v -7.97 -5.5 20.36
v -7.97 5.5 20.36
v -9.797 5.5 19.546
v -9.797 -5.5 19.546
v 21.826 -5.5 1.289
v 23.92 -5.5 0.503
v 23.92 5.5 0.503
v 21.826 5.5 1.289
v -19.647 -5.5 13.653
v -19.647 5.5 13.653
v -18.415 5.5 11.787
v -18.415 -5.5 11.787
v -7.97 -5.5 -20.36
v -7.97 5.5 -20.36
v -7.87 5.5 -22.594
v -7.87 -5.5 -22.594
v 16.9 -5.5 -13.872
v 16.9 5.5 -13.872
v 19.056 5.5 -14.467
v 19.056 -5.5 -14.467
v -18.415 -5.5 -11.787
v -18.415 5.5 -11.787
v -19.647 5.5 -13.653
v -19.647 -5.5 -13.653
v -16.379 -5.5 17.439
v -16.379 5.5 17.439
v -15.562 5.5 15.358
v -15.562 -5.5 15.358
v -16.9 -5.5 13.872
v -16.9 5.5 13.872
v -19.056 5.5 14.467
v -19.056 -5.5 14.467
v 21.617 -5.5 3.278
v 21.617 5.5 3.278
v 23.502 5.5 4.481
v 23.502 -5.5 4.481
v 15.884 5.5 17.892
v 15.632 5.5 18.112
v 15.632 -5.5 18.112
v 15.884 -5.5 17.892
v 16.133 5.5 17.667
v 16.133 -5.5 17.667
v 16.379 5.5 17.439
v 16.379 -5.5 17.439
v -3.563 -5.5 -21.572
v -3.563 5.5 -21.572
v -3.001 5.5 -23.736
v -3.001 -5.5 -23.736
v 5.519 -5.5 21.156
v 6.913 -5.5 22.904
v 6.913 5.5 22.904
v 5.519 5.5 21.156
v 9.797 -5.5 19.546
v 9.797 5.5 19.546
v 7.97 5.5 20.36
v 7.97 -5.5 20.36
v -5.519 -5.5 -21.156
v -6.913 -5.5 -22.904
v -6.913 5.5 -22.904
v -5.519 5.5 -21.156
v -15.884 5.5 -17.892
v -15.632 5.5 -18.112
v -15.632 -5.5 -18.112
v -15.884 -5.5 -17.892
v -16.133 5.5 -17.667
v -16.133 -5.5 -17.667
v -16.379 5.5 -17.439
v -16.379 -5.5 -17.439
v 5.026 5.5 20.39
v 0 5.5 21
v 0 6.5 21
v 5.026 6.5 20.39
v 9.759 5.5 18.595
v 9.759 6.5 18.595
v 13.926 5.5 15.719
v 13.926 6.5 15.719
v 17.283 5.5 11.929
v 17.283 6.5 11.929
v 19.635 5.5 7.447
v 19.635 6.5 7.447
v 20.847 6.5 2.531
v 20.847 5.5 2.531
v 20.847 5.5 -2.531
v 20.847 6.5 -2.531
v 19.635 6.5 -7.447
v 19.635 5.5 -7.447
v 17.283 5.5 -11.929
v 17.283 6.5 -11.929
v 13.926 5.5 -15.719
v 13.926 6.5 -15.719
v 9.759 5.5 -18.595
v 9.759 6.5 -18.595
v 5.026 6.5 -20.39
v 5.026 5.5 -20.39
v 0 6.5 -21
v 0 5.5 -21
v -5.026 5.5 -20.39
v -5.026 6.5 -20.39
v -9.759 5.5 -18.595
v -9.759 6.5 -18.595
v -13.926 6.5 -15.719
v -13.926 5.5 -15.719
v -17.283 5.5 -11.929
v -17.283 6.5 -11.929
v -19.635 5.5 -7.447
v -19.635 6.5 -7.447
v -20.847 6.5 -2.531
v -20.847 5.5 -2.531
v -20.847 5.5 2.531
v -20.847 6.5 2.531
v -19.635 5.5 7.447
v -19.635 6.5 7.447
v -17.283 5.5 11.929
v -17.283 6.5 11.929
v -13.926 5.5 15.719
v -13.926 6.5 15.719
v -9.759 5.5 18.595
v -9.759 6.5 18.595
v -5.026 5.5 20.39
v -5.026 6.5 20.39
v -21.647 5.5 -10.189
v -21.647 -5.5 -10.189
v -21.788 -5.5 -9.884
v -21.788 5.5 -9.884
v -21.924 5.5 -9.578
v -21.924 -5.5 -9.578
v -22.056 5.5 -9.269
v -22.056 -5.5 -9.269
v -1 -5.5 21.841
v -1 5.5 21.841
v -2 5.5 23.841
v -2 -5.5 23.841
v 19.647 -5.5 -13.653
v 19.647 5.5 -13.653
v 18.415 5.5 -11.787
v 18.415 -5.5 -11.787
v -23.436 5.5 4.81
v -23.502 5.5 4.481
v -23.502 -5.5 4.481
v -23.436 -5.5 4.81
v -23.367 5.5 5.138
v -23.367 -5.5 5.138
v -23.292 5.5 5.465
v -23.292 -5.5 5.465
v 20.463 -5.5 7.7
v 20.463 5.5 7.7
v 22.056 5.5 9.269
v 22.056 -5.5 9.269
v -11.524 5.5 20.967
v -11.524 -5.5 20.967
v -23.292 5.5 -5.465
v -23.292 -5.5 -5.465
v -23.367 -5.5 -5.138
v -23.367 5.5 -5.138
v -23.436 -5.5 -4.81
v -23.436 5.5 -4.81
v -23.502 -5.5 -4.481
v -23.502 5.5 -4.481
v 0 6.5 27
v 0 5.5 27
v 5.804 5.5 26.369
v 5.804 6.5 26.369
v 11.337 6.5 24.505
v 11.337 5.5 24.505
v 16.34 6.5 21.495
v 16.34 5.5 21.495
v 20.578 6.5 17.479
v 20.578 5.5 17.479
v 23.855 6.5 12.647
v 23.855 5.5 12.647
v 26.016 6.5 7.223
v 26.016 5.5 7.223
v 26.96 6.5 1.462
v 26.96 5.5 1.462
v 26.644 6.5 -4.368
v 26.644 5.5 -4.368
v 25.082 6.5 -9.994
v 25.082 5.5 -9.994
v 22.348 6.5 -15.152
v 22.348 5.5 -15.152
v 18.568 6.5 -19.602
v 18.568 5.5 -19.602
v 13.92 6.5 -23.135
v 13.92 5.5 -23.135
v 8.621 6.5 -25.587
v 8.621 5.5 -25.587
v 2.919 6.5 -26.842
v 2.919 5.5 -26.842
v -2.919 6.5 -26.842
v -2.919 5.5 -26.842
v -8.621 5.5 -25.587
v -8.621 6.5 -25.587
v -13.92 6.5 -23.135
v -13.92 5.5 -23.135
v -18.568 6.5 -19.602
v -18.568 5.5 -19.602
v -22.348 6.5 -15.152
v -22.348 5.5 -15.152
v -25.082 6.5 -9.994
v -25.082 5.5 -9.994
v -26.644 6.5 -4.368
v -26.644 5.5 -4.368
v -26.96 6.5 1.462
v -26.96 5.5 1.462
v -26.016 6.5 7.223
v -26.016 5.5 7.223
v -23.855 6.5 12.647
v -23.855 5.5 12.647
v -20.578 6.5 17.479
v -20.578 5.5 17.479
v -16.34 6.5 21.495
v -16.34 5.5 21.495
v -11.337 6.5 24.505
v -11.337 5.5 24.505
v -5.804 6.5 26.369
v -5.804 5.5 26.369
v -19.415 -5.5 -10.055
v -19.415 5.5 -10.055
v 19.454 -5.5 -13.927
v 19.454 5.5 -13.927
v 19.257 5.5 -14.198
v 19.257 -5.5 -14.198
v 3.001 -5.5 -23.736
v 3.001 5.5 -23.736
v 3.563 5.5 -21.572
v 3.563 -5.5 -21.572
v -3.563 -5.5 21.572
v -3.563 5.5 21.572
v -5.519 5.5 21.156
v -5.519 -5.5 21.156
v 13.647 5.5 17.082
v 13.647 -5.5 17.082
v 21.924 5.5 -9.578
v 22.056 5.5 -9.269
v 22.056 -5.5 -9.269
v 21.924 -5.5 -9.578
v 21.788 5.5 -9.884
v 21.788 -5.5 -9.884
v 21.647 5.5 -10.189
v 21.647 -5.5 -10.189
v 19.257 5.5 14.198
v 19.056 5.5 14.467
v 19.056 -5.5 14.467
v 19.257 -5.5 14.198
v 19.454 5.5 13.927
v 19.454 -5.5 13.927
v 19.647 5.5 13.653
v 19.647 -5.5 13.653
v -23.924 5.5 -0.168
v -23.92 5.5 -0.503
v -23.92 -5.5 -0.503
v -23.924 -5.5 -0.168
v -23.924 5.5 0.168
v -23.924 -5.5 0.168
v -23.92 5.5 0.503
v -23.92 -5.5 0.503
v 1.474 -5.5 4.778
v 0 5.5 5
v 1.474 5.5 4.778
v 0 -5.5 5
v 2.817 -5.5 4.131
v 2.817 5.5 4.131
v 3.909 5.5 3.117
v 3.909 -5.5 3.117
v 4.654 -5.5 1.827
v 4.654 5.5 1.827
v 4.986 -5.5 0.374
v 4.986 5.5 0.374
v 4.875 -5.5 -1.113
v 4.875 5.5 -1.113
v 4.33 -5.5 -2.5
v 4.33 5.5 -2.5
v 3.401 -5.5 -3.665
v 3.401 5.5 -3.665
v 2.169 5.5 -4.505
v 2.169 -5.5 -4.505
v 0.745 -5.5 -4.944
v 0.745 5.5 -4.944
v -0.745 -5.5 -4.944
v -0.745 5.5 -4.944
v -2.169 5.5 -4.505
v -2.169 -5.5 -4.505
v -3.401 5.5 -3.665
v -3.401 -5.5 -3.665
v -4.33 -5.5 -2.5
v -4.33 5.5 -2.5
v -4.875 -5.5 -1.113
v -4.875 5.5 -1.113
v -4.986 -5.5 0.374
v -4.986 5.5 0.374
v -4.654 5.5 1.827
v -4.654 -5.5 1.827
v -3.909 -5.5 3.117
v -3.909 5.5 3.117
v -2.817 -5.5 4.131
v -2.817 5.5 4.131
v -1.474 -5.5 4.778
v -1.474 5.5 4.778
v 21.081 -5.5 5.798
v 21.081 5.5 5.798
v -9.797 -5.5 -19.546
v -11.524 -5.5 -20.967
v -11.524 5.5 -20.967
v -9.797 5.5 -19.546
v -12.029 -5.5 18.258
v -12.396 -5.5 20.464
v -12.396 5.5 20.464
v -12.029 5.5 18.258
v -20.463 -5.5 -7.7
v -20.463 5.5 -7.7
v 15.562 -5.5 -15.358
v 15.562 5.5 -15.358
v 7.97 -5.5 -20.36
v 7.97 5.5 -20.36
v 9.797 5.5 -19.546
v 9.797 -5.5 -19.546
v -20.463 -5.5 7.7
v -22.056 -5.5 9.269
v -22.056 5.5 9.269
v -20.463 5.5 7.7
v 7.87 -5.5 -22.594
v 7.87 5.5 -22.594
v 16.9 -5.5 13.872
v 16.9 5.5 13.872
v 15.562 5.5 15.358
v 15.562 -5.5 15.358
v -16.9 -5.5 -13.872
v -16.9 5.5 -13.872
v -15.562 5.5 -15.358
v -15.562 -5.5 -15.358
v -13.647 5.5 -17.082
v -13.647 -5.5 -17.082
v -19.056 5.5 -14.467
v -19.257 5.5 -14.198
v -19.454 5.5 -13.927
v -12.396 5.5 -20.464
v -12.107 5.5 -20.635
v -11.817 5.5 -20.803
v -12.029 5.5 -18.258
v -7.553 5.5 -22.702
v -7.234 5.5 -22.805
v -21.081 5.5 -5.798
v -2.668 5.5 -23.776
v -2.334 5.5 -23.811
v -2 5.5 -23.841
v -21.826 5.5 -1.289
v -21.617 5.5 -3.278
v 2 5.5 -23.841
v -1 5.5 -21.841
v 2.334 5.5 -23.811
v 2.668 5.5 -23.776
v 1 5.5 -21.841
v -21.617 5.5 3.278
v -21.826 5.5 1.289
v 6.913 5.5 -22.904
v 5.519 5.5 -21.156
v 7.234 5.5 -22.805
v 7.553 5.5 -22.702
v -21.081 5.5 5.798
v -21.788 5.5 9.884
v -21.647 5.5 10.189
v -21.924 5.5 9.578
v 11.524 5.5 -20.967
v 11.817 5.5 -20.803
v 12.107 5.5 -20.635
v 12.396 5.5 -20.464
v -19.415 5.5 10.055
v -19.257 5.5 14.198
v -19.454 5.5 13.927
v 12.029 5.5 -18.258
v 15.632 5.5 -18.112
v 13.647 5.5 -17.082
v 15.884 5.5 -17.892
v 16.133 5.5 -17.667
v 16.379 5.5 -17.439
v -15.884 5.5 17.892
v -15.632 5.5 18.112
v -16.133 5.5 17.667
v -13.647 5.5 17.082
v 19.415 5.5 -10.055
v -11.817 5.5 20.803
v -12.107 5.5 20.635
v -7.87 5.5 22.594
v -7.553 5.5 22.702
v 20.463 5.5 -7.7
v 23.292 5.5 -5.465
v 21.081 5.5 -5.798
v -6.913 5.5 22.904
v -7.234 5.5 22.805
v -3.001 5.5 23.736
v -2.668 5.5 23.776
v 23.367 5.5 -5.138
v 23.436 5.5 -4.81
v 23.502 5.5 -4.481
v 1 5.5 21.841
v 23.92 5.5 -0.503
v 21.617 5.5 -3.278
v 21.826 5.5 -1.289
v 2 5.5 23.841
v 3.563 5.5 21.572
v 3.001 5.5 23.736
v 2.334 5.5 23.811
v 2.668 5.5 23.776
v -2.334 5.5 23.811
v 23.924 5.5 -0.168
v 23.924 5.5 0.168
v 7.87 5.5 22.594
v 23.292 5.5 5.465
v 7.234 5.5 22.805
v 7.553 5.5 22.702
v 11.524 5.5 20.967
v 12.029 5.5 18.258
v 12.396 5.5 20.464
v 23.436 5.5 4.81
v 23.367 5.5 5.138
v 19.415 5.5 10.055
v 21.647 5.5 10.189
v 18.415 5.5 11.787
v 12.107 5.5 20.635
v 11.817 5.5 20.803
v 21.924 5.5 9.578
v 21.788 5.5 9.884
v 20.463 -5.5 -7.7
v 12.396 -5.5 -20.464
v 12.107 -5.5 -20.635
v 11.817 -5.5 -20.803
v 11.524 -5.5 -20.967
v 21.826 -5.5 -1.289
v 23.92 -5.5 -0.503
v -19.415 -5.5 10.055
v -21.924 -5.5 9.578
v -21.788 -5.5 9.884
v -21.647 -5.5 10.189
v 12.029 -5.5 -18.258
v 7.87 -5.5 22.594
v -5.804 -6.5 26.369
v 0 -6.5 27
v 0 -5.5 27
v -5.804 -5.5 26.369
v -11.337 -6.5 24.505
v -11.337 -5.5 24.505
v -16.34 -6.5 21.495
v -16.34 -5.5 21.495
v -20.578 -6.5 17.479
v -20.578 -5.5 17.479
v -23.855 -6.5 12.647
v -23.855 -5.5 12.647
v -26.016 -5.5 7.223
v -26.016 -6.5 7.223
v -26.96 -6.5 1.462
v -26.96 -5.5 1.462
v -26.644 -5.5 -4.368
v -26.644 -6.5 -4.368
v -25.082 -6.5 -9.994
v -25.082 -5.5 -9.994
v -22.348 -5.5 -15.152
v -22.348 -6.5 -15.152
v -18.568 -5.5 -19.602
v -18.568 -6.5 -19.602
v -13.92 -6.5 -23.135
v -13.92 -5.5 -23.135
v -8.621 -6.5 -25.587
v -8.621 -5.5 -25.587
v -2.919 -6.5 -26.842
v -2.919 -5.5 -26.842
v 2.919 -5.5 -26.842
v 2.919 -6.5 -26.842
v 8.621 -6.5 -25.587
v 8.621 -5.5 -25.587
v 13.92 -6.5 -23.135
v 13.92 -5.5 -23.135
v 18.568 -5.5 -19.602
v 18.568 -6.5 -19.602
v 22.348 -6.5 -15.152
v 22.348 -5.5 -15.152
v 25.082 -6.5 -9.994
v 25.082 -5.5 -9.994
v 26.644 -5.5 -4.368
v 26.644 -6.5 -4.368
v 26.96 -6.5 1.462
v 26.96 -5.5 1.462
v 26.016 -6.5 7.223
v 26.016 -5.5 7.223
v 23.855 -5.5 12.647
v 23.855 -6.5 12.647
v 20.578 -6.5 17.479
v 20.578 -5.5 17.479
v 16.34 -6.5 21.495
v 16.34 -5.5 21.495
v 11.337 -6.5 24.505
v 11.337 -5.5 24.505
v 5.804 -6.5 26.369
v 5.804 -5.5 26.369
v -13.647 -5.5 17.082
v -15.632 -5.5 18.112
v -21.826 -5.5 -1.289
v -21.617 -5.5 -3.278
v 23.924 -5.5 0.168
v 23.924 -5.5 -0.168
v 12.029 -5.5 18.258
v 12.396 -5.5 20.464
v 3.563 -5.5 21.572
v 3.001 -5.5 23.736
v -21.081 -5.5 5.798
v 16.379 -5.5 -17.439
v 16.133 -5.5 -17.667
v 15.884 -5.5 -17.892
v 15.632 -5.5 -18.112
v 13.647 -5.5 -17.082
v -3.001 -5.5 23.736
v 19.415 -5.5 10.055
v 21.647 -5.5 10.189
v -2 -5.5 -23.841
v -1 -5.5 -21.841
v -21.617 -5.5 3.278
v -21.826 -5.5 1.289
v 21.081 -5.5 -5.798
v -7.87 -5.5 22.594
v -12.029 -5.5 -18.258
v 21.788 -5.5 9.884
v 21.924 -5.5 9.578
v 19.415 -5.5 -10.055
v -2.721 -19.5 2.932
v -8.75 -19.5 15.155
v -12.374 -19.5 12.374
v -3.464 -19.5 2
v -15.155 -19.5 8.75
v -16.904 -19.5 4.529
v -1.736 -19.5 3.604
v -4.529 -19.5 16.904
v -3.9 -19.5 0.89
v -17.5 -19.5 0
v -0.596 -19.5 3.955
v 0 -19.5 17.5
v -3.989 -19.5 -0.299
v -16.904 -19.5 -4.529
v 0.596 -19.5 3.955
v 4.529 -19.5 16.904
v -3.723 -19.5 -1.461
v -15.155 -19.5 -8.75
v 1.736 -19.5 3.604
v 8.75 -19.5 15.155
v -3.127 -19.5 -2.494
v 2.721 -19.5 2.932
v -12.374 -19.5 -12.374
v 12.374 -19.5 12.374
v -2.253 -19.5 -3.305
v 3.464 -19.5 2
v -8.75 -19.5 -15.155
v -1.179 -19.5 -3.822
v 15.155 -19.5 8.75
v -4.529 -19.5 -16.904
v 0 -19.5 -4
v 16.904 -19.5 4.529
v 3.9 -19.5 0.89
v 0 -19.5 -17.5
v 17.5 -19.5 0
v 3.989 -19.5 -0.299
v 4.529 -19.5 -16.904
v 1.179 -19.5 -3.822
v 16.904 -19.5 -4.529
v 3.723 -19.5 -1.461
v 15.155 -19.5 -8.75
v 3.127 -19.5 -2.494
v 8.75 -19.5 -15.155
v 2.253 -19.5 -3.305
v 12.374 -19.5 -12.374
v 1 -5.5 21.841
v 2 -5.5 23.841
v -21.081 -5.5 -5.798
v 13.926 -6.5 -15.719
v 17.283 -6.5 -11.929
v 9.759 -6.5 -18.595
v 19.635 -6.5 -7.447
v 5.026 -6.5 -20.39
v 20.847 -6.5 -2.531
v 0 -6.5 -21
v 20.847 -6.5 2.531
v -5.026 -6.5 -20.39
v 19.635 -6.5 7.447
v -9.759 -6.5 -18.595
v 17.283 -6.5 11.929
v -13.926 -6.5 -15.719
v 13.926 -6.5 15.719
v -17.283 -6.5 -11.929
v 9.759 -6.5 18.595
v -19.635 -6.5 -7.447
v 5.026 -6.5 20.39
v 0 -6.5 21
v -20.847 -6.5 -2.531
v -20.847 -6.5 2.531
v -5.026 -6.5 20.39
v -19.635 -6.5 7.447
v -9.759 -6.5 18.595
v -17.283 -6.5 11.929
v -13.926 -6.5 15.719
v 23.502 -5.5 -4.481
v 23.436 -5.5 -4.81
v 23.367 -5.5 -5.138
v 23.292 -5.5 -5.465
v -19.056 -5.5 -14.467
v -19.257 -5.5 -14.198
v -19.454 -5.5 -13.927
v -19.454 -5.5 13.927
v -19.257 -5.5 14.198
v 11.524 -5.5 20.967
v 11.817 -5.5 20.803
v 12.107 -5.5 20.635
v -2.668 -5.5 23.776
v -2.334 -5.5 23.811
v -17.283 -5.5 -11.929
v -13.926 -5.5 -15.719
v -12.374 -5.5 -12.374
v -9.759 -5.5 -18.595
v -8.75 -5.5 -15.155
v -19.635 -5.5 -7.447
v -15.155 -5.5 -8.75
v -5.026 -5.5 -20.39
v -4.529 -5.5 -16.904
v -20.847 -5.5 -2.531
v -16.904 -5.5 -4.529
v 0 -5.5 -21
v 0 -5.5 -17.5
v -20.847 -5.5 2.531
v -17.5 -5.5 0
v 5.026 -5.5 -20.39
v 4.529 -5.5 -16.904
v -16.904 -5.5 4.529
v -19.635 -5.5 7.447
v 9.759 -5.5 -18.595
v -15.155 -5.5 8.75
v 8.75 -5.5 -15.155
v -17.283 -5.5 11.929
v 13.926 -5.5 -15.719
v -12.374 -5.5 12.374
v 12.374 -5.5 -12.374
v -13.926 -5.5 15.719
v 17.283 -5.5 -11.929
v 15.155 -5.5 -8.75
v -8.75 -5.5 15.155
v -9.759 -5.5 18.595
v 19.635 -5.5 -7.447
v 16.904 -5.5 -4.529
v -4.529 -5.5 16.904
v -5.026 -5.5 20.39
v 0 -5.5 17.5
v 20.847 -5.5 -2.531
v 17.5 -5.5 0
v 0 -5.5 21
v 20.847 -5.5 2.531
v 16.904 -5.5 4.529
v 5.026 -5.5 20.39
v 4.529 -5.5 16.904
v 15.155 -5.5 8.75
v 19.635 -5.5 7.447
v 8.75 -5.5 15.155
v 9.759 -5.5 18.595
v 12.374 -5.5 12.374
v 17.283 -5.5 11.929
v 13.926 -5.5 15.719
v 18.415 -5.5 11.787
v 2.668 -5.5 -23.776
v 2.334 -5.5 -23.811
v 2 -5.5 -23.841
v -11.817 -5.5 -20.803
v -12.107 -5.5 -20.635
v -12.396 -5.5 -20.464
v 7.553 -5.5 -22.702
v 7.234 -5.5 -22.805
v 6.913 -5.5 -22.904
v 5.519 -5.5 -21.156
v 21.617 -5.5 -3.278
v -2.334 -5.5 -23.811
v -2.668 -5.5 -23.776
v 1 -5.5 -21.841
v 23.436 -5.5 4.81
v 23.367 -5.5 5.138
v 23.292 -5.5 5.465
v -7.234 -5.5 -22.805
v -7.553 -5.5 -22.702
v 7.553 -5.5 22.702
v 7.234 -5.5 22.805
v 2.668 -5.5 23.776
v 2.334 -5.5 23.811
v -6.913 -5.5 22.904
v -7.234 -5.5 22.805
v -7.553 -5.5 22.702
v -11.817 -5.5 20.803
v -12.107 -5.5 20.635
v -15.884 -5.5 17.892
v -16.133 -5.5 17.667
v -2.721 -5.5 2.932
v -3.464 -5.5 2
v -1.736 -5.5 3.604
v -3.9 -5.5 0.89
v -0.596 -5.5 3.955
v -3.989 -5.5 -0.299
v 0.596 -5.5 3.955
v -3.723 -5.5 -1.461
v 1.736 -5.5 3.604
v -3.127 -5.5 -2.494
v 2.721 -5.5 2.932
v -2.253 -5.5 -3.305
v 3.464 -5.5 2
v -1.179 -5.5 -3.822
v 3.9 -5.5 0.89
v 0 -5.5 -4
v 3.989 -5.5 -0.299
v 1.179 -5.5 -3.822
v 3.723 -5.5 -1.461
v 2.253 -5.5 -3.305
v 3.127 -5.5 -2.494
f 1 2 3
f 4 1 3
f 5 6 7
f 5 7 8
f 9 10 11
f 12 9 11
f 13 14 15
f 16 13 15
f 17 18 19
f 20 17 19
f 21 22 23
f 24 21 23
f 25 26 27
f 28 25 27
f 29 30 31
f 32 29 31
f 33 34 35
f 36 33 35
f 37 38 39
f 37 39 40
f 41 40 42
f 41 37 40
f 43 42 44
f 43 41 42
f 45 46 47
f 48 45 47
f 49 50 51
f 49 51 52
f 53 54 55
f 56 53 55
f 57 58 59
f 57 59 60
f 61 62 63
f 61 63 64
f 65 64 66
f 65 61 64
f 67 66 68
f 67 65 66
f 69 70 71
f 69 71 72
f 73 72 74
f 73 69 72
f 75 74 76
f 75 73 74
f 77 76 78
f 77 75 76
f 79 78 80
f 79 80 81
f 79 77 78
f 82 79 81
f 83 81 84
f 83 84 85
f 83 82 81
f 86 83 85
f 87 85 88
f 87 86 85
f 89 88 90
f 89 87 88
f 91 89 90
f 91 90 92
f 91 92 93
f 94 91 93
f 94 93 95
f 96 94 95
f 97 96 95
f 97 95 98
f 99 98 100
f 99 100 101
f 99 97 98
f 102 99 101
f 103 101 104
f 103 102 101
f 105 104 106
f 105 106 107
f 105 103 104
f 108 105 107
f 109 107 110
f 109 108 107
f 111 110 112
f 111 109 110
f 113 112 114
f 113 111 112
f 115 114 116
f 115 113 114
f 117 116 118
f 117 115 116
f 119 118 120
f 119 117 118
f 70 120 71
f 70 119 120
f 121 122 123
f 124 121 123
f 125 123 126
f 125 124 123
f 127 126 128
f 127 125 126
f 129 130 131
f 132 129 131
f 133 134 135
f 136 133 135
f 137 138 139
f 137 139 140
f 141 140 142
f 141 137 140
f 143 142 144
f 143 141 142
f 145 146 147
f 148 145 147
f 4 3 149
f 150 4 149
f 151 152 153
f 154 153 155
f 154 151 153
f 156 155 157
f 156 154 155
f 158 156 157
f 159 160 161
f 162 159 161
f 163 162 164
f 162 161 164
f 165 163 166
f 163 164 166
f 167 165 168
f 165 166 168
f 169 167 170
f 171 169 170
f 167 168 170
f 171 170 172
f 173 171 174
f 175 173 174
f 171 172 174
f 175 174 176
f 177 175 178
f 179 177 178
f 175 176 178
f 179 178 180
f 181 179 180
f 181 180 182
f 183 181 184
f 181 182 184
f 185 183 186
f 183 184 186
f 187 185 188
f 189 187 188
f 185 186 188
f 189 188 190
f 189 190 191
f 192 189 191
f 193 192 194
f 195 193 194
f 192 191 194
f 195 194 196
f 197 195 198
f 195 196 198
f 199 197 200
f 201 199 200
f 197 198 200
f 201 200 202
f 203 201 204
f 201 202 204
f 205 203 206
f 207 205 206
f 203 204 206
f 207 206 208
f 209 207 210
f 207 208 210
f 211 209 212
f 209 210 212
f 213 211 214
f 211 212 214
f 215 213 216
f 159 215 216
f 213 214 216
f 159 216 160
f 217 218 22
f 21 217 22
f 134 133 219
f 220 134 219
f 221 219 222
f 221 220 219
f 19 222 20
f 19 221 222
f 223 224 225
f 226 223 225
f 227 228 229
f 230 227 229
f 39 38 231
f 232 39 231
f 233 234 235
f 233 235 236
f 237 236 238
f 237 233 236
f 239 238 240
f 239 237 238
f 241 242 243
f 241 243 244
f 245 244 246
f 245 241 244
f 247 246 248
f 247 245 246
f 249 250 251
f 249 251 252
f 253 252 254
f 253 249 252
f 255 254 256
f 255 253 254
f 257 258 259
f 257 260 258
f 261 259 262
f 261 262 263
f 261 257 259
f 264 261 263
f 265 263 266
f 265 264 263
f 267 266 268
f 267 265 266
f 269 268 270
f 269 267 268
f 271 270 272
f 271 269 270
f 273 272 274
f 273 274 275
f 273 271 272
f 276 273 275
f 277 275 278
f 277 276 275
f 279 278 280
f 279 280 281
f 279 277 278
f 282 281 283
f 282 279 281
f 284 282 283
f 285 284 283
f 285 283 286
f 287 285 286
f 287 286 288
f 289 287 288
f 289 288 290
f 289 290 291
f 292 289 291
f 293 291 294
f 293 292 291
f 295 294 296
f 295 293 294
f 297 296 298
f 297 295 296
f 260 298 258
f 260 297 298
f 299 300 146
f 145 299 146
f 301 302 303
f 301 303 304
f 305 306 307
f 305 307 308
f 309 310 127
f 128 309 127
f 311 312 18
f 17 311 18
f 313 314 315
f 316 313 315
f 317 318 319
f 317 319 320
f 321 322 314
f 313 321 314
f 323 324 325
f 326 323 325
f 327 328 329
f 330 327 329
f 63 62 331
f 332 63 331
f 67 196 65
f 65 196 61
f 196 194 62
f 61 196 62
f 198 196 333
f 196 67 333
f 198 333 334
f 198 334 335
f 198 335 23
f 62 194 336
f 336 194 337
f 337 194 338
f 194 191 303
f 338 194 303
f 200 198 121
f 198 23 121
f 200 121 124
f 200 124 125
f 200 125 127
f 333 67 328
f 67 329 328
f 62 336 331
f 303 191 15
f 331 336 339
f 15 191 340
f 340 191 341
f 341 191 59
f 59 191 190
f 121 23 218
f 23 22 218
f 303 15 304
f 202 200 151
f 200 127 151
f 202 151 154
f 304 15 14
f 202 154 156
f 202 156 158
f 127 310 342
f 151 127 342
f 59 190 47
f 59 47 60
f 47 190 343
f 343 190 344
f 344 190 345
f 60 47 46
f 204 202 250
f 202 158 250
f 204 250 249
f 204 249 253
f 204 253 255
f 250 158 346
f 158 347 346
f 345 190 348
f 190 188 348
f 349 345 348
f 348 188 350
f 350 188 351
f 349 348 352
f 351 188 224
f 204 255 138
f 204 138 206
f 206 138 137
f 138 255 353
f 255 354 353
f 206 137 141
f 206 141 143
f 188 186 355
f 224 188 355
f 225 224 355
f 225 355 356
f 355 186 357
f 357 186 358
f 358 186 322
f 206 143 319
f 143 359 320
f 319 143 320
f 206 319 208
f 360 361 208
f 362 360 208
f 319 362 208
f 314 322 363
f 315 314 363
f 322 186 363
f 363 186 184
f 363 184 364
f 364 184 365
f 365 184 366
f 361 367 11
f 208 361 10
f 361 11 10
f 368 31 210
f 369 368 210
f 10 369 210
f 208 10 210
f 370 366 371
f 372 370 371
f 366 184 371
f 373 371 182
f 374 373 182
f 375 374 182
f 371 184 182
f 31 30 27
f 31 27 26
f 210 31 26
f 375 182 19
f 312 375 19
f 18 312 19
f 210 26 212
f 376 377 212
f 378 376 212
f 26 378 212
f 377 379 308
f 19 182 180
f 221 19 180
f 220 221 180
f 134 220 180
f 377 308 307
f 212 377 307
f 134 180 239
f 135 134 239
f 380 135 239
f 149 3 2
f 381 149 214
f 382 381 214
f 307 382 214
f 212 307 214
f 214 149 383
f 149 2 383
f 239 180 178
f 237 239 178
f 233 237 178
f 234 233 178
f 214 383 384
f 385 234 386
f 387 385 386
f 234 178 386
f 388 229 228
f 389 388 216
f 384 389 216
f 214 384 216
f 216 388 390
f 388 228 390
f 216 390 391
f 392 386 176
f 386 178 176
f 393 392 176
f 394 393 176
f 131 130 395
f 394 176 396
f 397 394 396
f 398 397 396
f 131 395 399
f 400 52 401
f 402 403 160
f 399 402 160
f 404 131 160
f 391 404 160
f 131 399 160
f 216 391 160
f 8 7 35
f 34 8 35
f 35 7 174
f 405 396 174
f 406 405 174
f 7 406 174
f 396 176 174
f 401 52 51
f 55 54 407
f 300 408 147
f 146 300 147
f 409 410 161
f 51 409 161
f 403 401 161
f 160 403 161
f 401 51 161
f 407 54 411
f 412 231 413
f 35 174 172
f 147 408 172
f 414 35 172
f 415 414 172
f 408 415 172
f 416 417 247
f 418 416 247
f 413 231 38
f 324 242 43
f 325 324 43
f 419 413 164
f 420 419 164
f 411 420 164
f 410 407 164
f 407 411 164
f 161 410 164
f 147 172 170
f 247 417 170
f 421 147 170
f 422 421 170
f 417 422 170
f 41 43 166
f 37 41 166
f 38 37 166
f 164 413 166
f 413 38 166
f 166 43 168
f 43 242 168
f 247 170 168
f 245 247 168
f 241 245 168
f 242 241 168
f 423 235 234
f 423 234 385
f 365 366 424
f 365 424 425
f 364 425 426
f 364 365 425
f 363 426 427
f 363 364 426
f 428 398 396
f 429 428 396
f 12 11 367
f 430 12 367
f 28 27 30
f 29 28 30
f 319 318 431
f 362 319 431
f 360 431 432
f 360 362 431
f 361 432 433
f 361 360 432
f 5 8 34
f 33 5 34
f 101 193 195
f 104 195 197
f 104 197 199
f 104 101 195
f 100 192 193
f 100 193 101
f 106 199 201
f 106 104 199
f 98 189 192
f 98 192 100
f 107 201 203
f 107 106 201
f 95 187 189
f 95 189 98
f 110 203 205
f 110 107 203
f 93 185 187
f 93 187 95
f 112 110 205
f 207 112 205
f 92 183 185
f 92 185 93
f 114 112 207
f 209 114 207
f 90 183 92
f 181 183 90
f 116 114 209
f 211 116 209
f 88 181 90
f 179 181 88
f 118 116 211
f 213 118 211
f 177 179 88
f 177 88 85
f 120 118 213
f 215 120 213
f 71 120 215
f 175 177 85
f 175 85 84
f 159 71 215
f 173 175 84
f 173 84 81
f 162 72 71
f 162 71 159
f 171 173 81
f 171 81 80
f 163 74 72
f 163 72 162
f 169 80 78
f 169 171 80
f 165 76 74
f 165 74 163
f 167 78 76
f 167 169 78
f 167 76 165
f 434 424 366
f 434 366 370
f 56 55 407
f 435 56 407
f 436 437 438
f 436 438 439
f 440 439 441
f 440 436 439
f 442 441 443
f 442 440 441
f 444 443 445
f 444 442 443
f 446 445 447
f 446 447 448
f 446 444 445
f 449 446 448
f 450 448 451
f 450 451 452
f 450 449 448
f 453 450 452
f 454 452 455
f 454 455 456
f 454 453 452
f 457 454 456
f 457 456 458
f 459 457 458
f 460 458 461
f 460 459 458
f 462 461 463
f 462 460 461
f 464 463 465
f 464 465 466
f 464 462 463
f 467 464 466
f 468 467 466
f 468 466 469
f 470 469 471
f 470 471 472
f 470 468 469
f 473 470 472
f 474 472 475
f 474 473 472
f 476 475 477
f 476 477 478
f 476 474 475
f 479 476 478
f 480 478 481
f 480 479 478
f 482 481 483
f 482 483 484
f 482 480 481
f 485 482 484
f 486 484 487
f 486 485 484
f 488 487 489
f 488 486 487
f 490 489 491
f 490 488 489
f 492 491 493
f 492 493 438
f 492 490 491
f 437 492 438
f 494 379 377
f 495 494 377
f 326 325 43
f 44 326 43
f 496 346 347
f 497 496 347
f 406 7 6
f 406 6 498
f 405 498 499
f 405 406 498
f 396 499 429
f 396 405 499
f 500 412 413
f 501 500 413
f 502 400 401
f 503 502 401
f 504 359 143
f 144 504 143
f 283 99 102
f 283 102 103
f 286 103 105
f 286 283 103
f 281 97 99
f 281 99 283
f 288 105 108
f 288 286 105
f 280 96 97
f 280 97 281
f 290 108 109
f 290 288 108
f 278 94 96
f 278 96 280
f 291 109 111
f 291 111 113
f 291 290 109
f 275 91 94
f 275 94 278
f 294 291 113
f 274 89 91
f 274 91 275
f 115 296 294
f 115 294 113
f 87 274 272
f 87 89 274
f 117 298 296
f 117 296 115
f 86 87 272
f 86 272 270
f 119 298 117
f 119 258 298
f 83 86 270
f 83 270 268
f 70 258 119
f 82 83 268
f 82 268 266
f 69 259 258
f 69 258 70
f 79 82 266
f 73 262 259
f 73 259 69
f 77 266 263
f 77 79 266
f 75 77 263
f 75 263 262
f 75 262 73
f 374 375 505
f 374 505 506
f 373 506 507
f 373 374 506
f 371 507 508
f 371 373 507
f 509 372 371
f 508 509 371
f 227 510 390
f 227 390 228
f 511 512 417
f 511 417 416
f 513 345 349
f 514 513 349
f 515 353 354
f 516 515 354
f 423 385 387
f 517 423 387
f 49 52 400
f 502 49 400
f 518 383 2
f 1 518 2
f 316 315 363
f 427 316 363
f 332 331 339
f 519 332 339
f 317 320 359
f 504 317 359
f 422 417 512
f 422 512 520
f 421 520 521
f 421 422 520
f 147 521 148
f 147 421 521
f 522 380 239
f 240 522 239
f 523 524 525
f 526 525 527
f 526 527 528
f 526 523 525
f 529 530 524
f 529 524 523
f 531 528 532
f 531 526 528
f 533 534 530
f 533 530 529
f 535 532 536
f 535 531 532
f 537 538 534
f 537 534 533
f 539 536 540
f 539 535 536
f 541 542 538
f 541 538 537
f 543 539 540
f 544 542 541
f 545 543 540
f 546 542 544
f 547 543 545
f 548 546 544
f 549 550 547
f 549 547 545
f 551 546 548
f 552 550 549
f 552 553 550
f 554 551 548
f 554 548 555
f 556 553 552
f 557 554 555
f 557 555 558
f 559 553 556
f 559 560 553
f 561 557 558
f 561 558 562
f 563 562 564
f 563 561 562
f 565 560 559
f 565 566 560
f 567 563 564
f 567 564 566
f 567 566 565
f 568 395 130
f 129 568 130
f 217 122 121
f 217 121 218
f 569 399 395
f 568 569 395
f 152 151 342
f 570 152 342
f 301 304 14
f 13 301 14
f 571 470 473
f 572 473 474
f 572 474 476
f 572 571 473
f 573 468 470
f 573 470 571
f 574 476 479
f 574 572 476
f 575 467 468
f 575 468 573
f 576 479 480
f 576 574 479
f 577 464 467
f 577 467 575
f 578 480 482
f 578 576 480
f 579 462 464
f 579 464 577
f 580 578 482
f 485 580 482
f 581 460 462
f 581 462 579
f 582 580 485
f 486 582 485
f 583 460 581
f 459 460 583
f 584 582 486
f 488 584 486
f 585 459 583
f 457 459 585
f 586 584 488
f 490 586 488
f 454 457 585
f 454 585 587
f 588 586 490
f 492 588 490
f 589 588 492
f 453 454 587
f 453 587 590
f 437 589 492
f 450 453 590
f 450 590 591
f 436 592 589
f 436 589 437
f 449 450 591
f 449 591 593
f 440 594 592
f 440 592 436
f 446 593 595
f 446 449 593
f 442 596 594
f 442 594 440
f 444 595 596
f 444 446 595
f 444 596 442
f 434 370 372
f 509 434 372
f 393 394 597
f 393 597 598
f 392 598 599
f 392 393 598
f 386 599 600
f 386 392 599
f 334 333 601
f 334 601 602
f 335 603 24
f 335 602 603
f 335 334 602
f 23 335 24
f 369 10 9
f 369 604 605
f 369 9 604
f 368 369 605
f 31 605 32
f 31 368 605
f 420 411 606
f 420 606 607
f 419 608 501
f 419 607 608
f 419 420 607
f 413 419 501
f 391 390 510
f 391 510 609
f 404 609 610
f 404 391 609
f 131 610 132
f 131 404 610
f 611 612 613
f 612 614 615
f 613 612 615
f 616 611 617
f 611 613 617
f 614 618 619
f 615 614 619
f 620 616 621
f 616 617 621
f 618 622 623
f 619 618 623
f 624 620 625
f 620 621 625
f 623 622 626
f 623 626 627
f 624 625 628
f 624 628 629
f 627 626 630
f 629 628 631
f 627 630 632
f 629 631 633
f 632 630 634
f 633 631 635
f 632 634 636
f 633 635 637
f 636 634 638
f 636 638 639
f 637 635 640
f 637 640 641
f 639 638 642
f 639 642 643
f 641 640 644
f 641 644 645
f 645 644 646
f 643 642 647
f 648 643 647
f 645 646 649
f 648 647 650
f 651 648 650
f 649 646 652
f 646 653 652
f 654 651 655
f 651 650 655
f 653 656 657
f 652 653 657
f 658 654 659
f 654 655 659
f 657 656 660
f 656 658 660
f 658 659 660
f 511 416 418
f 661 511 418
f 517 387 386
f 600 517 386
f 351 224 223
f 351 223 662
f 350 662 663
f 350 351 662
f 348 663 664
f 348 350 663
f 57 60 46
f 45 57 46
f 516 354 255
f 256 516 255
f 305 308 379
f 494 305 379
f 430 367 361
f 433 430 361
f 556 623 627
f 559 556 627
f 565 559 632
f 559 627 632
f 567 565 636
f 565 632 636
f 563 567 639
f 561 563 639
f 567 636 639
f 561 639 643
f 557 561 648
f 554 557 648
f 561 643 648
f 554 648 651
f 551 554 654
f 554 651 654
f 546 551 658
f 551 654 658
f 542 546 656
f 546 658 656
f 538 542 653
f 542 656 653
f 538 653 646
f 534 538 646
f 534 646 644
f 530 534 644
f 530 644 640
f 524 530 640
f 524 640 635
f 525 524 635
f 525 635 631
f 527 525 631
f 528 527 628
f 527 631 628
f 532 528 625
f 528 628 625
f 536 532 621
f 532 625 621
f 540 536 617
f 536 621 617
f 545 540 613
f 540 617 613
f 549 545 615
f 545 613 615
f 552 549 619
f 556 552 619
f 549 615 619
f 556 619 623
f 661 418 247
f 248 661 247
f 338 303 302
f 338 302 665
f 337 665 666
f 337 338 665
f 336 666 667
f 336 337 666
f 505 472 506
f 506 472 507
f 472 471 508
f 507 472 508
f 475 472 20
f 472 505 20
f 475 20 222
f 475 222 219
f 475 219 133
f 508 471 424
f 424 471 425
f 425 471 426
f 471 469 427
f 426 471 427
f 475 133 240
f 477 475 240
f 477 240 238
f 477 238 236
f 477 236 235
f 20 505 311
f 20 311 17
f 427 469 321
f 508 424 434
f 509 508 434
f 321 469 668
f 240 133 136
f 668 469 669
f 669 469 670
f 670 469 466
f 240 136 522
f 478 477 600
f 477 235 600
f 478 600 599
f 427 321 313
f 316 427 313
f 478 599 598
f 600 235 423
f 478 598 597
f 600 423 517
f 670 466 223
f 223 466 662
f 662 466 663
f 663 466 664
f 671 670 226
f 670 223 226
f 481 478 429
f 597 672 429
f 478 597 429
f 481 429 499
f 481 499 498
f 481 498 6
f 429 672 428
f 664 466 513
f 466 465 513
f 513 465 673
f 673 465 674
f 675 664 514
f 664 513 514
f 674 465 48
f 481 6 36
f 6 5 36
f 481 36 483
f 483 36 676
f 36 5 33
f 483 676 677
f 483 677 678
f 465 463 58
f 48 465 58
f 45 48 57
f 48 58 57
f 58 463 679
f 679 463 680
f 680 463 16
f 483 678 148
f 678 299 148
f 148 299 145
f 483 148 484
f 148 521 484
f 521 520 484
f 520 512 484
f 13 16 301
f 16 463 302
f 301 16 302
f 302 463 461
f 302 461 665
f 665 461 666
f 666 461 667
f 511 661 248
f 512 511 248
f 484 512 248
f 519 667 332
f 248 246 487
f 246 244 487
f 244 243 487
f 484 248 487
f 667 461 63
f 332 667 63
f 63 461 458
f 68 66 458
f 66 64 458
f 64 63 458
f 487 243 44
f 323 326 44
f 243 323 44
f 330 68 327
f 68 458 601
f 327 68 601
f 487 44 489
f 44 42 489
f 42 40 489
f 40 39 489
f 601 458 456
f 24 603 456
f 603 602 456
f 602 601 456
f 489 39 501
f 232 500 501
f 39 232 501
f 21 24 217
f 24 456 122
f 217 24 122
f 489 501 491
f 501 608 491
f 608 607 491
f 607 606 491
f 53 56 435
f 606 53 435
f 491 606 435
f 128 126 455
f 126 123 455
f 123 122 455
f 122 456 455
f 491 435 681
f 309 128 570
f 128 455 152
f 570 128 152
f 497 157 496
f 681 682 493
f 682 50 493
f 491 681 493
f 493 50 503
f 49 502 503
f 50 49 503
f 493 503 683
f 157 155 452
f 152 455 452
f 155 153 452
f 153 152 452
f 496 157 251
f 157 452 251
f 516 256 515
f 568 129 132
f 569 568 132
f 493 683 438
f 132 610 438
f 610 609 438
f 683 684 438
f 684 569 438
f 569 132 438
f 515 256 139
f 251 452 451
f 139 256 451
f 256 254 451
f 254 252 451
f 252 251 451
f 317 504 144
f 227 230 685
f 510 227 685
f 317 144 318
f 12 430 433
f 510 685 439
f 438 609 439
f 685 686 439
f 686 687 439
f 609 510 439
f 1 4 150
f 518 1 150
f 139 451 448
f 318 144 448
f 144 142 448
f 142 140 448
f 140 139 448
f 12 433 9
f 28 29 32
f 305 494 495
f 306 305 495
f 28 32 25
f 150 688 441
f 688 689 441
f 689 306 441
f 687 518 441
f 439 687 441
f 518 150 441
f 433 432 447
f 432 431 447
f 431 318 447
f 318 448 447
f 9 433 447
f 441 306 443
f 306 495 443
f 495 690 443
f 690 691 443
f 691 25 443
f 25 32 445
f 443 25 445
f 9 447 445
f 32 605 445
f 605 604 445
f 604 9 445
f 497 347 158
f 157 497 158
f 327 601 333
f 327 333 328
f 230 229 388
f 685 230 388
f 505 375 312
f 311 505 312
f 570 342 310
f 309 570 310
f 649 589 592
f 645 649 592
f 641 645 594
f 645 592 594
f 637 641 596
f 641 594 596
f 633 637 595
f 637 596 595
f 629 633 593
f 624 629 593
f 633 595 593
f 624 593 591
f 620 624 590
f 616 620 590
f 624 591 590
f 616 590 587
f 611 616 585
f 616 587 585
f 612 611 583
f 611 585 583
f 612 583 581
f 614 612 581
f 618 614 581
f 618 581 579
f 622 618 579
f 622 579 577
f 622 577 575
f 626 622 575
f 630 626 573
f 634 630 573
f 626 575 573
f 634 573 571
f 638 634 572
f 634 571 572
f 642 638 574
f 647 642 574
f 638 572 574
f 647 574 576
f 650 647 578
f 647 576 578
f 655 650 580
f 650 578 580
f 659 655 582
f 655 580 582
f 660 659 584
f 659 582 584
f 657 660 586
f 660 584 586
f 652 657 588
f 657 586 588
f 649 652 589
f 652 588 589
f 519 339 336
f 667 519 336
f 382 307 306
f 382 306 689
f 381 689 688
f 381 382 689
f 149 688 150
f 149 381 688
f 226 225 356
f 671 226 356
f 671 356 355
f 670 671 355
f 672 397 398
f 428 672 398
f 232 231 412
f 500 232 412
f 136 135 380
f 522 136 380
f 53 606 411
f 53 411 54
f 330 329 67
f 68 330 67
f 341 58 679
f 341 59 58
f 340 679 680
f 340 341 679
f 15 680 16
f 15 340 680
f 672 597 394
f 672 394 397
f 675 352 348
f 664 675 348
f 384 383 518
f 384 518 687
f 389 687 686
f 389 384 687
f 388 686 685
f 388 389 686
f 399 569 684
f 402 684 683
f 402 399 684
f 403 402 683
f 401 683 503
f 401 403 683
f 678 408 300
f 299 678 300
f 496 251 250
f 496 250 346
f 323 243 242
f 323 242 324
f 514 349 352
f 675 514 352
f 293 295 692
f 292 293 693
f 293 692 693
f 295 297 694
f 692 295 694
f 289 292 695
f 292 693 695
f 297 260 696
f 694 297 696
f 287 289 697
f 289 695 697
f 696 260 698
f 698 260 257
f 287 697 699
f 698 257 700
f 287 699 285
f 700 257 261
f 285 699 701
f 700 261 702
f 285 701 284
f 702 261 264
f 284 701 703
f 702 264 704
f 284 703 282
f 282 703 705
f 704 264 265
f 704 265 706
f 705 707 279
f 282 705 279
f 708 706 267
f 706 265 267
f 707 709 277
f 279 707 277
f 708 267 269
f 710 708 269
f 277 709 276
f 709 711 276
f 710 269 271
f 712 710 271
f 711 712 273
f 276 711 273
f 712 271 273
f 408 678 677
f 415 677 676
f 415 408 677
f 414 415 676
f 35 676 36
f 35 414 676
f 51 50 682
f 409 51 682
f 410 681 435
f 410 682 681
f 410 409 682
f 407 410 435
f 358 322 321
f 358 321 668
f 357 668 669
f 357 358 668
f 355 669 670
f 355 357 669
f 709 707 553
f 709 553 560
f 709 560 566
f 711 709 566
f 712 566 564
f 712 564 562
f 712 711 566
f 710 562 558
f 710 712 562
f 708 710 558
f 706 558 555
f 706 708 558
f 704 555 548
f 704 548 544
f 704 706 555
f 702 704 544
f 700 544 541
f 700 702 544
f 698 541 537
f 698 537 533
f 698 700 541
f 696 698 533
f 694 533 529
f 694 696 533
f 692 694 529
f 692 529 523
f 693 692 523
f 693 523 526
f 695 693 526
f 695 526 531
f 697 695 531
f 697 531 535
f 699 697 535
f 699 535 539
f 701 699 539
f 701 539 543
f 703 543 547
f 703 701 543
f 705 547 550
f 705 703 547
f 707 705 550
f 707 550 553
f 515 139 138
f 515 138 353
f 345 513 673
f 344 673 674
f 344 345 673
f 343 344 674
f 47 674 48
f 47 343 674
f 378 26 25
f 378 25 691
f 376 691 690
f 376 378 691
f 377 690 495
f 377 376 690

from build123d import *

# Parameters (mm, degrees)
SKETCH1_R           = 23.925
SKETCH1_R_2         = 5
BOSS_EXTRUDE1_DEPTH = 5.5
SKETCH2_R           = 17.5
SKETCH2_R_2         = 4
BOSS_EXTRUDE3_DEPTH = 14
CUT_EXTRUDE1_DEPTH  = 11
CIRPATTERN10_COUNT  = 30
SKETCH4_R           = 27
SKETCH4_R_2         = 21
BOSS_EXTRUDE4_DEPTH = 1
BOSS_EXTRUDE5_START = 1
SKETCH5_R           = 27
SKETCH5_R_2         = 21
BOSS_EXTRUDE5_DEPTH = 1


with BuildPart() as part:
    # Sketch1 → Boss-Extrude1 (new, symmetric)
    with BuildSketch(Plane(origin=(0, 0, 0), x_dir=(1, 0, 0), z_dir=(0, 1, 0))):
        with Locations(Location((0, 0, 0), (0, 0, 270))):
            Circle(SKETCH1_R)
        with Locations(Location((0, 0, 0), (0, 0, 270))):
            Circle(SKETCH1_R_2, mode=Mode.SUBTRACT)
    extrude(amount=BOSS_EXTRUDE1_DEPTH, both=True)

    # Sketch2 → Boss-Extrude3 (add)
    with BuildSketch(Plane.XZ.offset(5.5)):
        with Locations(Location((0, 0, 0), (0, 0, 270))):
            Circle(SKETCH2_R)
        with Locations(Location((0, 0, 0), (0, 0, 270))):
            Circle(SKETCH2_R_2, mode=Mode.SUBTRACT)
    extrude(amount=BOSS_EXTRUDE3_DEPTH)

    # Sketch3 → Cut-Extrude1 (cut)
    with BuildSketch(Plane(origin=(0, 5.5, 0), x_dir=(1, 0, 0), z_dir=(0, 1, 0))):
        Polygon((-1, 21.84125888), (1, 21.84125888), (2, 23.84125888), (2.094207699, 23.965937646), (-2.062339383, 23.965937646), (-2, 23.84125888), align=None)
    cut_extrude1 = extrude(amount=-CUT_EXTRUDE1_DEPTH, mode=Mode.SUBTRACT)

    # CirPattern10: Cut-Extrude1 ×30 about axis
    cirpattern10_axis = Axis((0, 0, 0), (0, 1, 0))
    for i in range(1, CIRPATTERN10_COUNT):
        add(cut_extrude1.rotate(cirpattern10_axis, i * 360 / CIRPATTERN10_COUNT), mode=Mode.SUBTRACT)

    # Sketch4 → Boss-Extrude4 (add)
    with BuildSketch(Plane(origin=(0, 5.5, 0), x_dir=(1, 0, 0), z_dir=(0, 1, 0))):
        with Locations(Location((0, 0, 0), (0, 0, 270))):
            Circle(SKETCH4_R)
        with Locations(Location((0, 0, 0), (0, 0, 270))):
            Circle(SKETCH4_R_2, mode=Mode.SUBTRACT)
    extrude(amount=BOSS_EXTRUDE4_DEPTH)

    # Sketch5 → Boss-Extrude5 (add)
    with BuildSketch(Plane.XZ.offset(5.5).offset(BOSS_EXTRUDE5_START)):
        with Locations(Location((0, 0, 0), (0, 0, 90))):
            Circle(SKETCH5_R)
        with Locations(Location((0, 0, 0), (0, 0, 90))):
            Circle(SKETCH5_R_2, mode=Mode.SUBTRACT)
    extrude(amount=-BOSS_EXTRUDE5_DEPTH)


solid = part.part
